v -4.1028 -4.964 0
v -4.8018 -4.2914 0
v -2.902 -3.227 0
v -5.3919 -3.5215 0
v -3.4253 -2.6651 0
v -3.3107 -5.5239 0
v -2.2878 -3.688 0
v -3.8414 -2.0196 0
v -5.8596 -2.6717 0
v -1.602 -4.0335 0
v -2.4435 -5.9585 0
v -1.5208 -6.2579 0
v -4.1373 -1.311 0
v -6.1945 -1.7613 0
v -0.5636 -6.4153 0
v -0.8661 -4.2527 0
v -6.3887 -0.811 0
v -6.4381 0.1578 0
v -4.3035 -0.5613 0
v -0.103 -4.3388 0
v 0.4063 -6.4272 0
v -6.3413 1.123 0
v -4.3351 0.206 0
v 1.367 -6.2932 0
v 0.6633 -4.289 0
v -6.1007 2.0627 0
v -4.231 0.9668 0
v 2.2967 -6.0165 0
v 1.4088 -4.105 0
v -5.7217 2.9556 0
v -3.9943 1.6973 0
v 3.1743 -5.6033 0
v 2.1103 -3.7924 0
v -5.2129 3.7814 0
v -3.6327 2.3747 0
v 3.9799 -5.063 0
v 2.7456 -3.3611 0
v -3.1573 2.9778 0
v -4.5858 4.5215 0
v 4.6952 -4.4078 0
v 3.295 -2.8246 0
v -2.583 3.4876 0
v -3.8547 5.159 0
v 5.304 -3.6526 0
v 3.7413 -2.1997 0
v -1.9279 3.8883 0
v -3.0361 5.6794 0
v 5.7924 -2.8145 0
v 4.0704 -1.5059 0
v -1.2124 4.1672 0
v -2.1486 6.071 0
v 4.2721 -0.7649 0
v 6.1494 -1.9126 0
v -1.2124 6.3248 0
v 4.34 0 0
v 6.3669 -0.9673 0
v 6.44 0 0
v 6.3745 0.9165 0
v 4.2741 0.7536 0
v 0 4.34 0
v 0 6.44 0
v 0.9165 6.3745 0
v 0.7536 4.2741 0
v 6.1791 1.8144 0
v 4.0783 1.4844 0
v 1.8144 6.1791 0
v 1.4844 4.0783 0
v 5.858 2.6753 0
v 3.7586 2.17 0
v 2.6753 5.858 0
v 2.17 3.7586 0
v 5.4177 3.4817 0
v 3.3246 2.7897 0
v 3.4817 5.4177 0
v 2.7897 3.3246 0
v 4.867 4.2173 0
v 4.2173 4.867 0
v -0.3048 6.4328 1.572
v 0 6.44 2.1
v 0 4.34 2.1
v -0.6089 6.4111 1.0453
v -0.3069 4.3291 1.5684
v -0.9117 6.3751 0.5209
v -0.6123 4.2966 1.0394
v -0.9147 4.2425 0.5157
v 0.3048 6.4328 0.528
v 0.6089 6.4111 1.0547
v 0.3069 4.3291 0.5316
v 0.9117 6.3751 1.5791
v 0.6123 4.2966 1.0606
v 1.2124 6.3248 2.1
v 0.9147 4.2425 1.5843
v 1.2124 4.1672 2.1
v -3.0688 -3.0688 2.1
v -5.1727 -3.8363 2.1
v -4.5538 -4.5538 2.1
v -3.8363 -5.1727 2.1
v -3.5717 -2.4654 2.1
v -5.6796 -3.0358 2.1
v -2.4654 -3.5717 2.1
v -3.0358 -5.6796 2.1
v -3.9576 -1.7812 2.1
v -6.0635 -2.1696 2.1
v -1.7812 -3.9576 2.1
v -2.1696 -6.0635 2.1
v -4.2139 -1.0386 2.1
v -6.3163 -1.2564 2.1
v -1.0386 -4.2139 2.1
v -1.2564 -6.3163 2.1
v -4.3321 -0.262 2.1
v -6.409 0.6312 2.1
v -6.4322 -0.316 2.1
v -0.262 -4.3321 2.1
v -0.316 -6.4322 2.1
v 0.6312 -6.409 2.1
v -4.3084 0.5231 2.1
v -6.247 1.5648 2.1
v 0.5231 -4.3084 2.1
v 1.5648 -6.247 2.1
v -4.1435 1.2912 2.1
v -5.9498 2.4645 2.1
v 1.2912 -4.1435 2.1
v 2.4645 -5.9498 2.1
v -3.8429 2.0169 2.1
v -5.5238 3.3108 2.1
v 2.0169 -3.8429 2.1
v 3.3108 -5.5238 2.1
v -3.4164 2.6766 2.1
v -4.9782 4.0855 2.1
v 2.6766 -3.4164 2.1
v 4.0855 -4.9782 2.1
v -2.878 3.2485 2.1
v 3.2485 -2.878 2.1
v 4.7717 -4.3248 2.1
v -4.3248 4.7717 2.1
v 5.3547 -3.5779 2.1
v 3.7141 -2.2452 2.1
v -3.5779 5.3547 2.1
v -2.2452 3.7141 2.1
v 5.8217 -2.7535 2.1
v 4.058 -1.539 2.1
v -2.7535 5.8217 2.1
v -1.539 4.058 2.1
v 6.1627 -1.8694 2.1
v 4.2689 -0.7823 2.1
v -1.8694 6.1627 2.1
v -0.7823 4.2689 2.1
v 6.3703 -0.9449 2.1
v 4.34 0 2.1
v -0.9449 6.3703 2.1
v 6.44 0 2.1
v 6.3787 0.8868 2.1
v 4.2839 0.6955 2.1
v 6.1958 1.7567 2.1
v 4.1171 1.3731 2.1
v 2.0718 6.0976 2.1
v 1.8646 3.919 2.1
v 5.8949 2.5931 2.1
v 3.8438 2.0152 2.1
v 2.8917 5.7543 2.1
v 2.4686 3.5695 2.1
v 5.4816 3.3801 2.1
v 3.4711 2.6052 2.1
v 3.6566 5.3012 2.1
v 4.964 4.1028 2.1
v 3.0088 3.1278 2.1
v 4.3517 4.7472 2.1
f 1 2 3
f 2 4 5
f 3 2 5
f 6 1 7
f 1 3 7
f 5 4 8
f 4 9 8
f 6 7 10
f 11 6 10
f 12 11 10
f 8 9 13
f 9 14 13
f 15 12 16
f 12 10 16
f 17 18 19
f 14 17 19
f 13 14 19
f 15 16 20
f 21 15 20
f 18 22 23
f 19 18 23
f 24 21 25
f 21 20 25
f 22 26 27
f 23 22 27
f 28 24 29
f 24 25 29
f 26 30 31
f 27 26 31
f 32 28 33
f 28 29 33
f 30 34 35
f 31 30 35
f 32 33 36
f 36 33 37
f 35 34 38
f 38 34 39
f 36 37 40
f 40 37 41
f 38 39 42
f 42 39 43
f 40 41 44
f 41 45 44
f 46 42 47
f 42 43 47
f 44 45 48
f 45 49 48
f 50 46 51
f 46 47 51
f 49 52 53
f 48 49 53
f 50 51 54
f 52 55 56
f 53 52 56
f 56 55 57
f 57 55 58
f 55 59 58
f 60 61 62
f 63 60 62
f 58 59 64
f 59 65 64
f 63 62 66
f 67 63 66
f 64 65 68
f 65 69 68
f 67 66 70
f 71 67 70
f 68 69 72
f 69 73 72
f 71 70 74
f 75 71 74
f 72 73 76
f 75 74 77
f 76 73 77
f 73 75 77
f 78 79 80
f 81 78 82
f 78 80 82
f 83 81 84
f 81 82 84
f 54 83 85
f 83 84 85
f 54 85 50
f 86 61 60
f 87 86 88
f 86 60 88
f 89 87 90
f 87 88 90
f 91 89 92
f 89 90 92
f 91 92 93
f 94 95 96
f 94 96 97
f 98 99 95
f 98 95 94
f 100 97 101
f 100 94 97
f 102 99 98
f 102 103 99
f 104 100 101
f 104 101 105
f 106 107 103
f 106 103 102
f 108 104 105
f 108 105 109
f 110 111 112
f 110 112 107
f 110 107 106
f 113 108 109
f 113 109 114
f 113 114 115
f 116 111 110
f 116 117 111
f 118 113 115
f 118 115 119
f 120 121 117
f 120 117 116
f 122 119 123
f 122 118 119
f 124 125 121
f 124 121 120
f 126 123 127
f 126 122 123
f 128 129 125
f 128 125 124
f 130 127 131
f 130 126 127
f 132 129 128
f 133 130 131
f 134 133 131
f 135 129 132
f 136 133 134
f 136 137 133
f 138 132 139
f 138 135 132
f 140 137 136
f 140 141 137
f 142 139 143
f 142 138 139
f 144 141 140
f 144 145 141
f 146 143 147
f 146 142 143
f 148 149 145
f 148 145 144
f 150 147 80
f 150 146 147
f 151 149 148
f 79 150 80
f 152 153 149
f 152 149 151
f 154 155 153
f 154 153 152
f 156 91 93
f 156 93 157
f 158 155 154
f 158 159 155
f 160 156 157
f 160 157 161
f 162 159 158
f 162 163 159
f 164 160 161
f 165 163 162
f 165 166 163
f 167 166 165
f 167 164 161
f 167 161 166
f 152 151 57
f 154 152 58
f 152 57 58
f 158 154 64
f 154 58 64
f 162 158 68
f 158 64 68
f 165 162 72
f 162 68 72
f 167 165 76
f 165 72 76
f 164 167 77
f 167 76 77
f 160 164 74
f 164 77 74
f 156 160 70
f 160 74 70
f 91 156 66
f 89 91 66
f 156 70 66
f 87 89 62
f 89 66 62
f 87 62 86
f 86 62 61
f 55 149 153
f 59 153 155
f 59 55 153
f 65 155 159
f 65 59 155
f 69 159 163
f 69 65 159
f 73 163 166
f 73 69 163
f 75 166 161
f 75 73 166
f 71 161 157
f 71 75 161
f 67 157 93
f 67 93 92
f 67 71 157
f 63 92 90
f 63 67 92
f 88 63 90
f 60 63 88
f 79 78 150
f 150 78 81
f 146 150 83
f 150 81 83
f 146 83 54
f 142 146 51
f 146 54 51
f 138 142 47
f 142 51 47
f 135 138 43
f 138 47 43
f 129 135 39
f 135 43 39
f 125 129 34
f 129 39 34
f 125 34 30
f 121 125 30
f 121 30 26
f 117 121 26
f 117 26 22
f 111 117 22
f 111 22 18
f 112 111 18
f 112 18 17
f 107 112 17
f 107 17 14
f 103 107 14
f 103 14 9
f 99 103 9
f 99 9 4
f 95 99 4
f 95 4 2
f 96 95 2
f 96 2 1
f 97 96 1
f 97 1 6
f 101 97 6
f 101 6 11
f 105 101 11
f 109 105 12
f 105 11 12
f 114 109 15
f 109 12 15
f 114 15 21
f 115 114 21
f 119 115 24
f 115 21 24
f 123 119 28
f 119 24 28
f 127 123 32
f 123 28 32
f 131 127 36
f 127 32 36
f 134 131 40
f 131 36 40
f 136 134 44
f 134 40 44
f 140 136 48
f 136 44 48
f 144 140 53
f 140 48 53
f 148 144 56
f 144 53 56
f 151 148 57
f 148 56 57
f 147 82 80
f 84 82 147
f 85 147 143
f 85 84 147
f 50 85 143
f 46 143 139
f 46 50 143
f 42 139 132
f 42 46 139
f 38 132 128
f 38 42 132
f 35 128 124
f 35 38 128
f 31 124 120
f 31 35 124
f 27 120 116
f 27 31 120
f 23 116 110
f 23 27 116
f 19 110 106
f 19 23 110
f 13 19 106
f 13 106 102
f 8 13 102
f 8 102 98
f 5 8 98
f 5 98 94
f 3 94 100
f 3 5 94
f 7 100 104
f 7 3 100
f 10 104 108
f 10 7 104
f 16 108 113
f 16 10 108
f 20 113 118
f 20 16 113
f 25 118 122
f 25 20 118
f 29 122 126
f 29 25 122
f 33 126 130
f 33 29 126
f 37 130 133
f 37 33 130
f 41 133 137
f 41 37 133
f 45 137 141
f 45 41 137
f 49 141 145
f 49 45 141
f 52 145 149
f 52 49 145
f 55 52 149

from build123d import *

# Parameters (mm, degrees)
SKETCH_1_R          = 6.44
SKETCH_1_R_2        = 4.34
EXTRUDE_1_DEPTH     = 2.1
CUT_EXTRUDE_1_DEPTH = 7.44


with BuildPart() as part:
    # 草图1 → 凸台-拉伸1 (new body)
    with BuildSketch(Plane.XY):
        Circle(SKETCH_1_R)
        Circle(SKETCH_1_R_2, mode=Mode.SUBTRACT)
    extrude(amount=EXTRUDE_1_DEPTH)

    # 草图2 → 切除-拉伸1 (cut, through all)
    with BuildSketch(Plane(origin=(0, 0, 0), x_dir=(1, 0, 0), z_dir=(0, 1, 0))):
        Polygon((0, 0), (1.212435565, -2.1), (0, -2.1), (-1.212435565, 0), align=None)
    extrude(amount=CUT_EXTRUDE_1_DEPTH, mode=Mode.SUBTRACT)


solid = part.part
